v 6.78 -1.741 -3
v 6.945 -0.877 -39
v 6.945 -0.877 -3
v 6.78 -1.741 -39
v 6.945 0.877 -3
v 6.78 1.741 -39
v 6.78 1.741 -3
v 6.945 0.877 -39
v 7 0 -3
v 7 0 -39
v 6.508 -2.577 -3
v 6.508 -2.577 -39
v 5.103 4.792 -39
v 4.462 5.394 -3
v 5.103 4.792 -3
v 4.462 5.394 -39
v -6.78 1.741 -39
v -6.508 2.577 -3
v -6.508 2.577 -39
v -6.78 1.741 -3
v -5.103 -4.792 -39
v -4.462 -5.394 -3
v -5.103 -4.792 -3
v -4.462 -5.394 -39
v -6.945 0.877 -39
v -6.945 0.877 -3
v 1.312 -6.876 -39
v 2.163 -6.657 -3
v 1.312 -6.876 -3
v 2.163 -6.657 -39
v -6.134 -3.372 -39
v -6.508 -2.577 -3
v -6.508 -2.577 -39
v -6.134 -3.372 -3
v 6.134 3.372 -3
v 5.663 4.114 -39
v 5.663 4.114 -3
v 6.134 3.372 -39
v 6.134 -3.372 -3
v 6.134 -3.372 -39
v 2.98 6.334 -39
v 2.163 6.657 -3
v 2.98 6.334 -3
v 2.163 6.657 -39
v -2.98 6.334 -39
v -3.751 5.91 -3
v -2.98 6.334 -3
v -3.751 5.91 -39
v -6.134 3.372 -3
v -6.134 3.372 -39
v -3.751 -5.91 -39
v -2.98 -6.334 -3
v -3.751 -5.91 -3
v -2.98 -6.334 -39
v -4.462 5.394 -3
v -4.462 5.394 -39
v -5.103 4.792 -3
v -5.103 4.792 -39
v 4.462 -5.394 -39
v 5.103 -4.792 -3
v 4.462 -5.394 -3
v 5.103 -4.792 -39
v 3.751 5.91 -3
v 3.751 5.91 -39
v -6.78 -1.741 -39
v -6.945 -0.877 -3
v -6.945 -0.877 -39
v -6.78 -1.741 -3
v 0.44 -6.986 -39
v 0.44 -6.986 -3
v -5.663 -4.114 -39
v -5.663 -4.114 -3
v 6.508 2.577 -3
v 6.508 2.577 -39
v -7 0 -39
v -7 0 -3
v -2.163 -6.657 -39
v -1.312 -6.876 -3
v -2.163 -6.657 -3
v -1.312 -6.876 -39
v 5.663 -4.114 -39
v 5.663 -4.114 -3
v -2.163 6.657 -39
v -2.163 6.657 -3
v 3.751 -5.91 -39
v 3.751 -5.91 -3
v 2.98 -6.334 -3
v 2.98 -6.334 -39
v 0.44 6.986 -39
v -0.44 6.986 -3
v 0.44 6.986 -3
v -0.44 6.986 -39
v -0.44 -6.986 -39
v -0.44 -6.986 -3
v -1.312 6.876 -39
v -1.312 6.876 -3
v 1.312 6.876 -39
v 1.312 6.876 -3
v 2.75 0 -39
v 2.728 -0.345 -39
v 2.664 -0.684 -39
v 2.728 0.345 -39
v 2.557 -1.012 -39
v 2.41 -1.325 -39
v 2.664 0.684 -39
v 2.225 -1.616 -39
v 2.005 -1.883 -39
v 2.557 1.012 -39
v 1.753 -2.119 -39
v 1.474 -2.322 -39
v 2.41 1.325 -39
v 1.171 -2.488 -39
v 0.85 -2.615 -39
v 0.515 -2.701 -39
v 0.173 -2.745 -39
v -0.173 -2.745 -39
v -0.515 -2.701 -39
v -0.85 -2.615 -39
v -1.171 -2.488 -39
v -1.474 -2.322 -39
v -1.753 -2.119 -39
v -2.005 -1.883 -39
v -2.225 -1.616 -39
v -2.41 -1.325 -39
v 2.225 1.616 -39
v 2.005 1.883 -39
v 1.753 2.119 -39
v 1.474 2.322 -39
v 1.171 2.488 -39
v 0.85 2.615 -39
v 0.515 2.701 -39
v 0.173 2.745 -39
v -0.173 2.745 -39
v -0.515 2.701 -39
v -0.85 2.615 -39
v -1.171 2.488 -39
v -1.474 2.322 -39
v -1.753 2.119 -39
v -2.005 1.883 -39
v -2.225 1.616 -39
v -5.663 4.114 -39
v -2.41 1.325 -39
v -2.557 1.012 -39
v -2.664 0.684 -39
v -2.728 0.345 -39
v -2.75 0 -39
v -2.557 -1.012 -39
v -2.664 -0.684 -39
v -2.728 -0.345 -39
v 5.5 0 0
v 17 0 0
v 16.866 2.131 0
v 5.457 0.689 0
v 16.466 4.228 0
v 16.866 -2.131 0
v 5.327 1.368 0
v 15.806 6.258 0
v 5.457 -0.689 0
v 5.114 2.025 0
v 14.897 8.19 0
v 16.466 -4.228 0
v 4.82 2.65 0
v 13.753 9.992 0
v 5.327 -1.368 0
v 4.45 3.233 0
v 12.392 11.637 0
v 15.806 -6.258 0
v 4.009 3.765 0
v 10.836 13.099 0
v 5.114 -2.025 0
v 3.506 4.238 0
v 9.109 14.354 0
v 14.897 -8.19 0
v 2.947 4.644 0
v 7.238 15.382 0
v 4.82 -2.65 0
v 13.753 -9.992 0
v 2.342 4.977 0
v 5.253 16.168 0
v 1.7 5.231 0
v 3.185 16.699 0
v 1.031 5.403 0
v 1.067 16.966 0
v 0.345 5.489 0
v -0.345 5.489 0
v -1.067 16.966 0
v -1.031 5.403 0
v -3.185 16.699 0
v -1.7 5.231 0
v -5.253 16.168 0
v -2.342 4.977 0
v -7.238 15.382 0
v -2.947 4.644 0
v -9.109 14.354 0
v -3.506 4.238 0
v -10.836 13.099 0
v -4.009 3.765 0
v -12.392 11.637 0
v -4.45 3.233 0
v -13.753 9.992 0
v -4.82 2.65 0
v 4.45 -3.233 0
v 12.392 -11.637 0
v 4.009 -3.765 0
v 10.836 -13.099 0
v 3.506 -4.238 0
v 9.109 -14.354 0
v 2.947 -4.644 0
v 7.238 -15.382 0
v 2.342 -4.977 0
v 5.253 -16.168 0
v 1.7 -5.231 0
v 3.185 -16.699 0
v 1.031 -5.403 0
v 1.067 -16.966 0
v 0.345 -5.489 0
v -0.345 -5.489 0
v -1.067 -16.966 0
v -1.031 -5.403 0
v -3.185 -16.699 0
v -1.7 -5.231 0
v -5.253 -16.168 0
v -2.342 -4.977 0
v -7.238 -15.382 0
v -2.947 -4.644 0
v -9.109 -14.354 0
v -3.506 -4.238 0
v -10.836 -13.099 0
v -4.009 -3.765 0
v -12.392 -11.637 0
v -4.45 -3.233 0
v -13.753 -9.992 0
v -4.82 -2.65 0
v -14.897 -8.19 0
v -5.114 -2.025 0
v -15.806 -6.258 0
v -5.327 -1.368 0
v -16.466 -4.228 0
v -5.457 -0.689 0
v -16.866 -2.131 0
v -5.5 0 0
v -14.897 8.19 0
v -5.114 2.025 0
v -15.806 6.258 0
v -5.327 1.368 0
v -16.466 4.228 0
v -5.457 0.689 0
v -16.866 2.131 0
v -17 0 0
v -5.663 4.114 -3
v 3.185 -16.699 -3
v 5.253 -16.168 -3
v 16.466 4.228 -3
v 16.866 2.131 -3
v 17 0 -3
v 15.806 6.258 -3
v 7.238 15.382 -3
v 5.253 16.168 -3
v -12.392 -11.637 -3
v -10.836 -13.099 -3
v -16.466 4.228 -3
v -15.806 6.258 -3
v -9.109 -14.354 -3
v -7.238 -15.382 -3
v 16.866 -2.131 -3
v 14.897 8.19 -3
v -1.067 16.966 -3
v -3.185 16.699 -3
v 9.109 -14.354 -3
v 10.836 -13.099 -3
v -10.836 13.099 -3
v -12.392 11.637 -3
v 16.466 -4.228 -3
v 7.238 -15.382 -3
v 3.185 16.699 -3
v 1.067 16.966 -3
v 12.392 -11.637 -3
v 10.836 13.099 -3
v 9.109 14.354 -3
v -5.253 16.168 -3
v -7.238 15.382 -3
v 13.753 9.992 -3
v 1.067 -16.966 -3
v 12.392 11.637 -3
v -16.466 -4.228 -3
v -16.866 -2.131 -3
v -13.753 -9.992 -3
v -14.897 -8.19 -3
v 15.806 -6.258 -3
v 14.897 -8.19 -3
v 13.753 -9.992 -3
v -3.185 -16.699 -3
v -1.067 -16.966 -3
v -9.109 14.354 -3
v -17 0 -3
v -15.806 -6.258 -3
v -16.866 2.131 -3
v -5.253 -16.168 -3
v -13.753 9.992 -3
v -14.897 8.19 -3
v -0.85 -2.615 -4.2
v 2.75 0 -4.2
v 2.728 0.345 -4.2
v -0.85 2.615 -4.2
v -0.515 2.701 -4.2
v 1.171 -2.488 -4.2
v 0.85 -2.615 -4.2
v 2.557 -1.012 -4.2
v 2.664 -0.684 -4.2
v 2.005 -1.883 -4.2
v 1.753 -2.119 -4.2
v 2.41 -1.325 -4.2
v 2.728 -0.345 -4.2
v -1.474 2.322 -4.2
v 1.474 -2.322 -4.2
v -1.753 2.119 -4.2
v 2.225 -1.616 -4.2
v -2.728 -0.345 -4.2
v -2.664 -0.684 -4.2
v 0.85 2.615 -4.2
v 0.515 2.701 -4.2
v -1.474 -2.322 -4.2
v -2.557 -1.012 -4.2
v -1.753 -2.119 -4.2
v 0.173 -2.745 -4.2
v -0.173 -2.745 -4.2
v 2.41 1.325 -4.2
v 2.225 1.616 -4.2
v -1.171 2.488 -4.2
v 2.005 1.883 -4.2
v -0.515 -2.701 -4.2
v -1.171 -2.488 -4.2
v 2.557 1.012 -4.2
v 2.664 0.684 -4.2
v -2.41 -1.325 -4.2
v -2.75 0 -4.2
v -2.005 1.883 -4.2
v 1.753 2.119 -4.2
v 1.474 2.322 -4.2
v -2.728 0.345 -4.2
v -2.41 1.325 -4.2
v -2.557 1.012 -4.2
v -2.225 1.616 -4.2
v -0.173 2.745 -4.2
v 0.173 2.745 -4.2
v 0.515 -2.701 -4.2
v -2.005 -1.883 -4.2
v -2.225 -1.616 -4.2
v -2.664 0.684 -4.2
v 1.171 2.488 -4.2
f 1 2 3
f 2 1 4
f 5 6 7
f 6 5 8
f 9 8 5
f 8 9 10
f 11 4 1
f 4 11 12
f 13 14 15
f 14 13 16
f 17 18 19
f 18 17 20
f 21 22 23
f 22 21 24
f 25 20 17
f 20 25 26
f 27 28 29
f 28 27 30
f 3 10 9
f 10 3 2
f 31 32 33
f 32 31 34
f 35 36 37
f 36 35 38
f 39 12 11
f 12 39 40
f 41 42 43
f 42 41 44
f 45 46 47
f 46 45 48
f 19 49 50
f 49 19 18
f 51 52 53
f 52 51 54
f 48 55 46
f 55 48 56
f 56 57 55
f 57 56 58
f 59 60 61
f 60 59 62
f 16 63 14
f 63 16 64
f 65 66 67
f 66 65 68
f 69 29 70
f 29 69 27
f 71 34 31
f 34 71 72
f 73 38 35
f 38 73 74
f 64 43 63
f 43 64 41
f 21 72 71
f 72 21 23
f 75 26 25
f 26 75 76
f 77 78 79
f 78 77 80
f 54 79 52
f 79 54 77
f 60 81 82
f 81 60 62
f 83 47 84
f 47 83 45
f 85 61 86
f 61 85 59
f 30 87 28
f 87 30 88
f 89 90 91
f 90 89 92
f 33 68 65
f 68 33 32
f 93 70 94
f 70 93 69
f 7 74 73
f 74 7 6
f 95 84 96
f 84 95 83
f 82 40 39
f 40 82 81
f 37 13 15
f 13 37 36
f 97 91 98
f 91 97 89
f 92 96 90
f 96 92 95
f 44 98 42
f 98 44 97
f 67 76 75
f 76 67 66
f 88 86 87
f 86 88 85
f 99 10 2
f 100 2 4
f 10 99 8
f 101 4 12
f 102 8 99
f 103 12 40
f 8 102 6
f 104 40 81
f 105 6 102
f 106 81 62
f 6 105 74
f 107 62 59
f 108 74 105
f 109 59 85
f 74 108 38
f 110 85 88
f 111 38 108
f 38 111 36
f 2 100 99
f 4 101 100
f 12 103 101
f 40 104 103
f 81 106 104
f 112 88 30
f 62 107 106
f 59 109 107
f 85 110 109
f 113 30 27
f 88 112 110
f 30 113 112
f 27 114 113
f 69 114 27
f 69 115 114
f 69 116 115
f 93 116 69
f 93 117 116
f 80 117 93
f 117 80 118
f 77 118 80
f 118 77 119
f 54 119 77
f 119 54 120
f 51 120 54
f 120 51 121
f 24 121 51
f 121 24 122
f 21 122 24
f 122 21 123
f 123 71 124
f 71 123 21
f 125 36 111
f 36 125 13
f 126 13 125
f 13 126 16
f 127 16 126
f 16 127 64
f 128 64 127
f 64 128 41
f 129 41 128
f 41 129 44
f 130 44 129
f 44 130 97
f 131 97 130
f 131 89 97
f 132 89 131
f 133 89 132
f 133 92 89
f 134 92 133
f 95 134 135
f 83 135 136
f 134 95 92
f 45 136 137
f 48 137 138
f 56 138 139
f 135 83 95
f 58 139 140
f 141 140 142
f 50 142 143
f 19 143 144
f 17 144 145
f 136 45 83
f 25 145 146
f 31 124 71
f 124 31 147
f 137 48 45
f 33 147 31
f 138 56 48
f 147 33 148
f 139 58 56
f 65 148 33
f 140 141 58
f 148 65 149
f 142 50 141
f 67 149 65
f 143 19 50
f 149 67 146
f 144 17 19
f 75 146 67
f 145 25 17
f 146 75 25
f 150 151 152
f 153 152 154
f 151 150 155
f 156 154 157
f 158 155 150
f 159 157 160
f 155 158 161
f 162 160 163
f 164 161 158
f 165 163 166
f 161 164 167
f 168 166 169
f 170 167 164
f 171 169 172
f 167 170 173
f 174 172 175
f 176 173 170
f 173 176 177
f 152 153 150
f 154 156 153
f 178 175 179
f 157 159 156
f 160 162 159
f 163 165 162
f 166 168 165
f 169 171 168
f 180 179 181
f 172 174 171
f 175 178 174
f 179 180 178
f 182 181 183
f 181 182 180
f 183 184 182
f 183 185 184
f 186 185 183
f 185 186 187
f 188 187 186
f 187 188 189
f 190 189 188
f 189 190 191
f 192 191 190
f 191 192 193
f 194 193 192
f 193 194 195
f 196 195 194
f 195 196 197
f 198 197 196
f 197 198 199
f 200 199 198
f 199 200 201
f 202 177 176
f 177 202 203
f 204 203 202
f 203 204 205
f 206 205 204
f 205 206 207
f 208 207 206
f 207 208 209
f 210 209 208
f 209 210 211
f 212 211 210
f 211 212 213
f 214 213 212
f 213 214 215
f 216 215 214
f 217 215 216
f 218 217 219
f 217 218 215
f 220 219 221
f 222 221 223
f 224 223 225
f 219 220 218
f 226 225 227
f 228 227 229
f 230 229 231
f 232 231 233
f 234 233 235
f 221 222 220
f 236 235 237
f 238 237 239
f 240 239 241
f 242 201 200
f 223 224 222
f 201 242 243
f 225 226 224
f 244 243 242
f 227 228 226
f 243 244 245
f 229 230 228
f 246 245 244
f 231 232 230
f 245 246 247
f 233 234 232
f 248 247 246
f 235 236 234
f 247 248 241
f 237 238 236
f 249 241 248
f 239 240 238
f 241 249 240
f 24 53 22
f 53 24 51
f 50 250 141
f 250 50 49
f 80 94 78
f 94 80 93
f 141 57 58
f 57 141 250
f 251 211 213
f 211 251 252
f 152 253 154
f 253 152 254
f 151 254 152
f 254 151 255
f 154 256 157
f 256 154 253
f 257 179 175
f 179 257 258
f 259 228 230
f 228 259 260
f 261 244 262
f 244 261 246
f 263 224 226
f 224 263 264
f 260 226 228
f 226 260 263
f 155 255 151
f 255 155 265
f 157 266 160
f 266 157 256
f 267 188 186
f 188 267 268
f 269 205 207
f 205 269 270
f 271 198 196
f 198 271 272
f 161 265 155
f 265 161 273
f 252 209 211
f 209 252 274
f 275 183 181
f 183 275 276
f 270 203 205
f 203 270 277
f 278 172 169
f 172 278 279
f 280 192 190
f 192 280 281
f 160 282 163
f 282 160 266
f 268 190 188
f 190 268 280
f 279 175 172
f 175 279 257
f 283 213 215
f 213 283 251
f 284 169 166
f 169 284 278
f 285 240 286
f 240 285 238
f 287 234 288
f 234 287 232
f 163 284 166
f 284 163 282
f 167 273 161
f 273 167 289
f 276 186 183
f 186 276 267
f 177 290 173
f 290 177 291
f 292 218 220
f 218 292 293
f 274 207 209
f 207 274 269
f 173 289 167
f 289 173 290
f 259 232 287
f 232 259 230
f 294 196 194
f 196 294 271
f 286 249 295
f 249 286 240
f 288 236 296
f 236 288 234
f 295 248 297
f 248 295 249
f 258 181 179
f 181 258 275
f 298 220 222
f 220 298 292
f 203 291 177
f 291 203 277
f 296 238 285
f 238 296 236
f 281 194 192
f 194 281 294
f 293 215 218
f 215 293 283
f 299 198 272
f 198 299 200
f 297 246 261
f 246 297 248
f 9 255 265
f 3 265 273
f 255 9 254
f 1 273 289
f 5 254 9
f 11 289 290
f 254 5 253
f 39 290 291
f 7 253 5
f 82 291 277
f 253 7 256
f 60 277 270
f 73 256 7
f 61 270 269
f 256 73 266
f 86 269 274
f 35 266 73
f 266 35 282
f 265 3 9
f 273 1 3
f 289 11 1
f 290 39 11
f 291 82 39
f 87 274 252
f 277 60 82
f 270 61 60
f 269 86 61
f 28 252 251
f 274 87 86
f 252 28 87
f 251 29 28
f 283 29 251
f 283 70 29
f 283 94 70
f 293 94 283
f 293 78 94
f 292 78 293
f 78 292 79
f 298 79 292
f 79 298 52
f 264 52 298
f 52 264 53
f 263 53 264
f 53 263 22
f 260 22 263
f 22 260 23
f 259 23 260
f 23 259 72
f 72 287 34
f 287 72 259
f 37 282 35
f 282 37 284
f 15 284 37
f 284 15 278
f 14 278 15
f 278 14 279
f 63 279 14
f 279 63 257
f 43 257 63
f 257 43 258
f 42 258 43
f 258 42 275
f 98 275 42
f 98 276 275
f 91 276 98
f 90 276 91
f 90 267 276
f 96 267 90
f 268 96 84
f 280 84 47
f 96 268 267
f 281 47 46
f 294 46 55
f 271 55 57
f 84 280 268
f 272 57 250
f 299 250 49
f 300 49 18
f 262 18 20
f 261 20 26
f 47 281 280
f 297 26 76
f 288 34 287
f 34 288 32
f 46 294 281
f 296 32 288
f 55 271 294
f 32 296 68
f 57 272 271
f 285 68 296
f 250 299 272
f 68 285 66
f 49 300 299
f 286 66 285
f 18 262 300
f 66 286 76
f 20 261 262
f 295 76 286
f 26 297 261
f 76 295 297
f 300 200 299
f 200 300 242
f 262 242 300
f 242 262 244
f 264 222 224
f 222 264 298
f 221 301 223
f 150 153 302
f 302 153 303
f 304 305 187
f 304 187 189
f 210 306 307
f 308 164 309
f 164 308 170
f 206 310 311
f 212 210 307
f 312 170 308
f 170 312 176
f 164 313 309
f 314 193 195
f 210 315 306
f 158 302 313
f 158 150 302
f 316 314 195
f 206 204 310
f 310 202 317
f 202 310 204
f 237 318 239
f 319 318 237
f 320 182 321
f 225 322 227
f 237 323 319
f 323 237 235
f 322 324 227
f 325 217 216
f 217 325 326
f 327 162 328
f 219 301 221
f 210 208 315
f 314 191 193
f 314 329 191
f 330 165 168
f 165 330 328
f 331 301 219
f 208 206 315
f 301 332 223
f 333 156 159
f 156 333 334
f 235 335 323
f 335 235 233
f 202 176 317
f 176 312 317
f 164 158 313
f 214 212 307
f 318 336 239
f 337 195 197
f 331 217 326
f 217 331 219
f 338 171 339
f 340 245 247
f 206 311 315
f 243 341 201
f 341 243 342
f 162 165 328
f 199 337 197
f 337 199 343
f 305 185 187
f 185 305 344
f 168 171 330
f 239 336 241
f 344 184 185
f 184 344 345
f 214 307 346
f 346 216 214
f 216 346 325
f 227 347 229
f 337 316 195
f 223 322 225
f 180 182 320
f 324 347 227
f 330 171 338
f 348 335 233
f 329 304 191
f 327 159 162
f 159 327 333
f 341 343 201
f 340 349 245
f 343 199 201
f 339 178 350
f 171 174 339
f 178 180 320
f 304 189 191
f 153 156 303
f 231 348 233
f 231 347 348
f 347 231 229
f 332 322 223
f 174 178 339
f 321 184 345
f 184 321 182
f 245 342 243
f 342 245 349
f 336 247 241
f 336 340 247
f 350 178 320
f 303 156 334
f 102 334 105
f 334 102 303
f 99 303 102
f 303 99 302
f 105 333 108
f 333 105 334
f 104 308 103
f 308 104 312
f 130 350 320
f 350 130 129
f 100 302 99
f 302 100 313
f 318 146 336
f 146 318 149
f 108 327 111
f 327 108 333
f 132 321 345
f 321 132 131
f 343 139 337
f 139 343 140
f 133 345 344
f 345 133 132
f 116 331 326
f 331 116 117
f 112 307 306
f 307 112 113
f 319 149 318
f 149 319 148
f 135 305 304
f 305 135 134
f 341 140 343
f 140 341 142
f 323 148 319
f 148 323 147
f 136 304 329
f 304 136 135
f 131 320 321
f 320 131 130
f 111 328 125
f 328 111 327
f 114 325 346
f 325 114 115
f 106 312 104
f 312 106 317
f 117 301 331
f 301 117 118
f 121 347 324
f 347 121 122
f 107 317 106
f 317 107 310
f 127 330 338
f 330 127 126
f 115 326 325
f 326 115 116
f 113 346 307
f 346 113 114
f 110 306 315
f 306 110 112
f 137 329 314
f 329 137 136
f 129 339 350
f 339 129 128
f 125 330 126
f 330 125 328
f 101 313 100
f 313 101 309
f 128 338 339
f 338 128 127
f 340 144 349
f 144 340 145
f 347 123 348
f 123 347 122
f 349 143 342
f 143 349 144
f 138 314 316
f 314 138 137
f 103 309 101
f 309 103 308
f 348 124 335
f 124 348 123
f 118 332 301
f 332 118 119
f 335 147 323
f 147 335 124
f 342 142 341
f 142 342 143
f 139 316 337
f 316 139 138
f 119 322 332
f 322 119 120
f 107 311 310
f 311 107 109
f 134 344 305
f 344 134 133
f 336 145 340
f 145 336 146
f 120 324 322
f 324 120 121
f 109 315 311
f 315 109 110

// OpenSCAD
$fn = 50;


difference() {
	union() {
		translate(v = [0, 0, -39.0000000000]) {
			cylinder(h = 39, r = 7.0000000000);
		}
		translate(v = [0, 0, -3.0000000000]) {
			cylinder(h = 3, r = 17.0000000000);
		}
	}
	union() {
		translate(v = [0, 0, 0]) {
			rotate(a = [0, 0, 0]) {
				difference() {
					union() {
						#translate(v = [0, 0, -39.0000000000]) {
							cylinder(h = 39, r = 2.2500000000);
						}
						#translate(v = [0, 0, -4.2000000000]) {
							cylinder(h = 4.2000000000, r1 = 2.7500000000, r2 = 5.5000000000);
						}
						#translate(v = [0, 0, -39.0000000000]) {
							cylinder(h = 39, r = 2.7500000000);
						}
						#translate(v = [0, 0, -39.0000000000]) {
							cylinder(h = 39, r = 2.2500000000);
						}
					}
					union();
				}
			}
		}
	}
}
